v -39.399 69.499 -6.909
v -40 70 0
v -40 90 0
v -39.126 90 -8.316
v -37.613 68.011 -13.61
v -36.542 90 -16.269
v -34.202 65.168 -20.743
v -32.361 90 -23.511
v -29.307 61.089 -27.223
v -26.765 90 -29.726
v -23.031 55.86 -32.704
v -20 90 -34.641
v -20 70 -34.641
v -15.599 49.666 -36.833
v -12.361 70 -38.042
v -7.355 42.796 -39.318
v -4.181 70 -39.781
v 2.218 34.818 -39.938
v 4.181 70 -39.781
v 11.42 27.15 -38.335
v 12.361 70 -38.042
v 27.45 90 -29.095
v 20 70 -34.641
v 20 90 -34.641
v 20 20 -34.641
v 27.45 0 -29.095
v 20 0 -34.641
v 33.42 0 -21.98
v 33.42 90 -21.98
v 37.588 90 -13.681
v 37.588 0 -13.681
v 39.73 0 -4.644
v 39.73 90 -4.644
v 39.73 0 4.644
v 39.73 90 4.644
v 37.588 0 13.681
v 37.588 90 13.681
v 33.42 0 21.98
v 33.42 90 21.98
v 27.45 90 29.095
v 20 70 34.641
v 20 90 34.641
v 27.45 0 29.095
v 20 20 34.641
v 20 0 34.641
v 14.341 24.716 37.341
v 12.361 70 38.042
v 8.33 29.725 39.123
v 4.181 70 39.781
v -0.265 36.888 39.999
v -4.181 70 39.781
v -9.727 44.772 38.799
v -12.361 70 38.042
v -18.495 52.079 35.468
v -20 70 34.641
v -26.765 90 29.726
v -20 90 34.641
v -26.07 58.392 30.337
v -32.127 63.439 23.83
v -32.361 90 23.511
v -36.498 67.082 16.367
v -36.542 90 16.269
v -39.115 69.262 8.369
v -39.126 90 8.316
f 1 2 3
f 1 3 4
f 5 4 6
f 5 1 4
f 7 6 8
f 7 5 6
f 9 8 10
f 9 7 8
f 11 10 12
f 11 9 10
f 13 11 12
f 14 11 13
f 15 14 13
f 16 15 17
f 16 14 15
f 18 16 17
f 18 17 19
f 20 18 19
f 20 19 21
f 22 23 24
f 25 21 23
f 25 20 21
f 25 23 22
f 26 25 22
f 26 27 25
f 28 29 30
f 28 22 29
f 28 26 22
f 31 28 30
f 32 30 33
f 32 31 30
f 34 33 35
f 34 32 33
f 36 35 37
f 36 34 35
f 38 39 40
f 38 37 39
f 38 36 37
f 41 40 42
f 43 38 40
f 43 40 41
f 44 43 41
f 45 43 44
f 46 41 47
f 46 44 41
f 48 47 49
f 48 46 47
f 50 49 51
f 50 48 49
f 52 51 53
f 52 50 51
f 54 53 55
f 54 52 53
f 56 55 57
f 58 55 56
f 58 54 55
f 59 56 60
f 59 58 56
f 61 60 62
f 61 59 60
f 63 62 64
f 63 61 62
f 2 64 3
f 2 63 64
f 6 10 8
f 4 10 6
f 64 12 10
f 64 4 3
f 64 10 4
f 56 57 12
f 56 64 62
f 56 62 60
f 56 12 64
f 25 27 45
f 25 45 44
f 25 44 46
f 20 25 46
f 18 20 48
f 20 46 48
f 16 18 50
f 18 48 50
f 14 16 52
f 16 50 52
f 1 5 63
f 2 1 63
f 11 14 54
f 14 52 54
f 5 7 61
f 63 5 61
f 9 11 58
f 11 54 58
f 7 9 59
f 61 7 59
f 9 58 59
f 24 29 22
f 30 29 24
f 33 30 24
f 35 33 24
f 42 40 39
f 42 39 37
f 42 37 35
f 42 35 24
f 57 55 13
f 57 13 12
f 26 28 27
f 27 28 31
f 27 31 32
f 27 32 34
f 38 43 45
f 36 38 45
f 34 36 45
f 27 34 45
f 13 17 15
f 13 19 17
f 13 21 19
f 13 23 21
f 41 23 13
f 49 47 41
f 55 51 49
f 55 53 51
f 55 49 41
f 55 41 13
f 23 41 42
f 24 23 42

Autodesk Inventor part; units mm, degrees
ref_plane "YZ Plane" through (0, 0, 0) normal (1, 0, 0) x (0, 1, 0)
ref_plane "XZ Plane" through (0, 0, 0) normal (0, 1, 0) x (-1, 0, 0)
ref_plane "XY Plane" through (0, 0, 0) normal (0, 0, 1) x (1, 0, 0)
sketch "Эскиз1" plane through (0, 0, 0) normal (0, 1, 0) x (-1, 0, 0)
  circle A0 centre (0, 0) radius 40
  dimension "d0" = 80
extrude "Выдавливание1" add sketch "Эскиз1" along normal blind 90
sketch "Эскиз2" plane through (0, 0, 0) normal (0, 0, 1) x (1, 0, 0)
  line L0 (0, 70) -> (-20, 70)
  line L1 (-20, 70) -> (-20, 90)
  line L2 (0, 70) -> (20, 70)
  line L3 (20, 70) -> (20, 90)
  line L4 (20, 0) -> (20, 20)
  line L5 (20, 20) -> (-40, 70)
  line L6 (-40, 70) -> (-40, 0)
  line L7 (20, 0) -> (-40, 0)
  line L8 (-40, 0) -> (20, 0)
  line L9 (-20, 90) -> (20, 90)
  point P0 (0, 0)
extrude "Выдавливание2" cut sketch "Эскиз2" against normal mid plane 1000
properties part number "Деталь1вар2"
